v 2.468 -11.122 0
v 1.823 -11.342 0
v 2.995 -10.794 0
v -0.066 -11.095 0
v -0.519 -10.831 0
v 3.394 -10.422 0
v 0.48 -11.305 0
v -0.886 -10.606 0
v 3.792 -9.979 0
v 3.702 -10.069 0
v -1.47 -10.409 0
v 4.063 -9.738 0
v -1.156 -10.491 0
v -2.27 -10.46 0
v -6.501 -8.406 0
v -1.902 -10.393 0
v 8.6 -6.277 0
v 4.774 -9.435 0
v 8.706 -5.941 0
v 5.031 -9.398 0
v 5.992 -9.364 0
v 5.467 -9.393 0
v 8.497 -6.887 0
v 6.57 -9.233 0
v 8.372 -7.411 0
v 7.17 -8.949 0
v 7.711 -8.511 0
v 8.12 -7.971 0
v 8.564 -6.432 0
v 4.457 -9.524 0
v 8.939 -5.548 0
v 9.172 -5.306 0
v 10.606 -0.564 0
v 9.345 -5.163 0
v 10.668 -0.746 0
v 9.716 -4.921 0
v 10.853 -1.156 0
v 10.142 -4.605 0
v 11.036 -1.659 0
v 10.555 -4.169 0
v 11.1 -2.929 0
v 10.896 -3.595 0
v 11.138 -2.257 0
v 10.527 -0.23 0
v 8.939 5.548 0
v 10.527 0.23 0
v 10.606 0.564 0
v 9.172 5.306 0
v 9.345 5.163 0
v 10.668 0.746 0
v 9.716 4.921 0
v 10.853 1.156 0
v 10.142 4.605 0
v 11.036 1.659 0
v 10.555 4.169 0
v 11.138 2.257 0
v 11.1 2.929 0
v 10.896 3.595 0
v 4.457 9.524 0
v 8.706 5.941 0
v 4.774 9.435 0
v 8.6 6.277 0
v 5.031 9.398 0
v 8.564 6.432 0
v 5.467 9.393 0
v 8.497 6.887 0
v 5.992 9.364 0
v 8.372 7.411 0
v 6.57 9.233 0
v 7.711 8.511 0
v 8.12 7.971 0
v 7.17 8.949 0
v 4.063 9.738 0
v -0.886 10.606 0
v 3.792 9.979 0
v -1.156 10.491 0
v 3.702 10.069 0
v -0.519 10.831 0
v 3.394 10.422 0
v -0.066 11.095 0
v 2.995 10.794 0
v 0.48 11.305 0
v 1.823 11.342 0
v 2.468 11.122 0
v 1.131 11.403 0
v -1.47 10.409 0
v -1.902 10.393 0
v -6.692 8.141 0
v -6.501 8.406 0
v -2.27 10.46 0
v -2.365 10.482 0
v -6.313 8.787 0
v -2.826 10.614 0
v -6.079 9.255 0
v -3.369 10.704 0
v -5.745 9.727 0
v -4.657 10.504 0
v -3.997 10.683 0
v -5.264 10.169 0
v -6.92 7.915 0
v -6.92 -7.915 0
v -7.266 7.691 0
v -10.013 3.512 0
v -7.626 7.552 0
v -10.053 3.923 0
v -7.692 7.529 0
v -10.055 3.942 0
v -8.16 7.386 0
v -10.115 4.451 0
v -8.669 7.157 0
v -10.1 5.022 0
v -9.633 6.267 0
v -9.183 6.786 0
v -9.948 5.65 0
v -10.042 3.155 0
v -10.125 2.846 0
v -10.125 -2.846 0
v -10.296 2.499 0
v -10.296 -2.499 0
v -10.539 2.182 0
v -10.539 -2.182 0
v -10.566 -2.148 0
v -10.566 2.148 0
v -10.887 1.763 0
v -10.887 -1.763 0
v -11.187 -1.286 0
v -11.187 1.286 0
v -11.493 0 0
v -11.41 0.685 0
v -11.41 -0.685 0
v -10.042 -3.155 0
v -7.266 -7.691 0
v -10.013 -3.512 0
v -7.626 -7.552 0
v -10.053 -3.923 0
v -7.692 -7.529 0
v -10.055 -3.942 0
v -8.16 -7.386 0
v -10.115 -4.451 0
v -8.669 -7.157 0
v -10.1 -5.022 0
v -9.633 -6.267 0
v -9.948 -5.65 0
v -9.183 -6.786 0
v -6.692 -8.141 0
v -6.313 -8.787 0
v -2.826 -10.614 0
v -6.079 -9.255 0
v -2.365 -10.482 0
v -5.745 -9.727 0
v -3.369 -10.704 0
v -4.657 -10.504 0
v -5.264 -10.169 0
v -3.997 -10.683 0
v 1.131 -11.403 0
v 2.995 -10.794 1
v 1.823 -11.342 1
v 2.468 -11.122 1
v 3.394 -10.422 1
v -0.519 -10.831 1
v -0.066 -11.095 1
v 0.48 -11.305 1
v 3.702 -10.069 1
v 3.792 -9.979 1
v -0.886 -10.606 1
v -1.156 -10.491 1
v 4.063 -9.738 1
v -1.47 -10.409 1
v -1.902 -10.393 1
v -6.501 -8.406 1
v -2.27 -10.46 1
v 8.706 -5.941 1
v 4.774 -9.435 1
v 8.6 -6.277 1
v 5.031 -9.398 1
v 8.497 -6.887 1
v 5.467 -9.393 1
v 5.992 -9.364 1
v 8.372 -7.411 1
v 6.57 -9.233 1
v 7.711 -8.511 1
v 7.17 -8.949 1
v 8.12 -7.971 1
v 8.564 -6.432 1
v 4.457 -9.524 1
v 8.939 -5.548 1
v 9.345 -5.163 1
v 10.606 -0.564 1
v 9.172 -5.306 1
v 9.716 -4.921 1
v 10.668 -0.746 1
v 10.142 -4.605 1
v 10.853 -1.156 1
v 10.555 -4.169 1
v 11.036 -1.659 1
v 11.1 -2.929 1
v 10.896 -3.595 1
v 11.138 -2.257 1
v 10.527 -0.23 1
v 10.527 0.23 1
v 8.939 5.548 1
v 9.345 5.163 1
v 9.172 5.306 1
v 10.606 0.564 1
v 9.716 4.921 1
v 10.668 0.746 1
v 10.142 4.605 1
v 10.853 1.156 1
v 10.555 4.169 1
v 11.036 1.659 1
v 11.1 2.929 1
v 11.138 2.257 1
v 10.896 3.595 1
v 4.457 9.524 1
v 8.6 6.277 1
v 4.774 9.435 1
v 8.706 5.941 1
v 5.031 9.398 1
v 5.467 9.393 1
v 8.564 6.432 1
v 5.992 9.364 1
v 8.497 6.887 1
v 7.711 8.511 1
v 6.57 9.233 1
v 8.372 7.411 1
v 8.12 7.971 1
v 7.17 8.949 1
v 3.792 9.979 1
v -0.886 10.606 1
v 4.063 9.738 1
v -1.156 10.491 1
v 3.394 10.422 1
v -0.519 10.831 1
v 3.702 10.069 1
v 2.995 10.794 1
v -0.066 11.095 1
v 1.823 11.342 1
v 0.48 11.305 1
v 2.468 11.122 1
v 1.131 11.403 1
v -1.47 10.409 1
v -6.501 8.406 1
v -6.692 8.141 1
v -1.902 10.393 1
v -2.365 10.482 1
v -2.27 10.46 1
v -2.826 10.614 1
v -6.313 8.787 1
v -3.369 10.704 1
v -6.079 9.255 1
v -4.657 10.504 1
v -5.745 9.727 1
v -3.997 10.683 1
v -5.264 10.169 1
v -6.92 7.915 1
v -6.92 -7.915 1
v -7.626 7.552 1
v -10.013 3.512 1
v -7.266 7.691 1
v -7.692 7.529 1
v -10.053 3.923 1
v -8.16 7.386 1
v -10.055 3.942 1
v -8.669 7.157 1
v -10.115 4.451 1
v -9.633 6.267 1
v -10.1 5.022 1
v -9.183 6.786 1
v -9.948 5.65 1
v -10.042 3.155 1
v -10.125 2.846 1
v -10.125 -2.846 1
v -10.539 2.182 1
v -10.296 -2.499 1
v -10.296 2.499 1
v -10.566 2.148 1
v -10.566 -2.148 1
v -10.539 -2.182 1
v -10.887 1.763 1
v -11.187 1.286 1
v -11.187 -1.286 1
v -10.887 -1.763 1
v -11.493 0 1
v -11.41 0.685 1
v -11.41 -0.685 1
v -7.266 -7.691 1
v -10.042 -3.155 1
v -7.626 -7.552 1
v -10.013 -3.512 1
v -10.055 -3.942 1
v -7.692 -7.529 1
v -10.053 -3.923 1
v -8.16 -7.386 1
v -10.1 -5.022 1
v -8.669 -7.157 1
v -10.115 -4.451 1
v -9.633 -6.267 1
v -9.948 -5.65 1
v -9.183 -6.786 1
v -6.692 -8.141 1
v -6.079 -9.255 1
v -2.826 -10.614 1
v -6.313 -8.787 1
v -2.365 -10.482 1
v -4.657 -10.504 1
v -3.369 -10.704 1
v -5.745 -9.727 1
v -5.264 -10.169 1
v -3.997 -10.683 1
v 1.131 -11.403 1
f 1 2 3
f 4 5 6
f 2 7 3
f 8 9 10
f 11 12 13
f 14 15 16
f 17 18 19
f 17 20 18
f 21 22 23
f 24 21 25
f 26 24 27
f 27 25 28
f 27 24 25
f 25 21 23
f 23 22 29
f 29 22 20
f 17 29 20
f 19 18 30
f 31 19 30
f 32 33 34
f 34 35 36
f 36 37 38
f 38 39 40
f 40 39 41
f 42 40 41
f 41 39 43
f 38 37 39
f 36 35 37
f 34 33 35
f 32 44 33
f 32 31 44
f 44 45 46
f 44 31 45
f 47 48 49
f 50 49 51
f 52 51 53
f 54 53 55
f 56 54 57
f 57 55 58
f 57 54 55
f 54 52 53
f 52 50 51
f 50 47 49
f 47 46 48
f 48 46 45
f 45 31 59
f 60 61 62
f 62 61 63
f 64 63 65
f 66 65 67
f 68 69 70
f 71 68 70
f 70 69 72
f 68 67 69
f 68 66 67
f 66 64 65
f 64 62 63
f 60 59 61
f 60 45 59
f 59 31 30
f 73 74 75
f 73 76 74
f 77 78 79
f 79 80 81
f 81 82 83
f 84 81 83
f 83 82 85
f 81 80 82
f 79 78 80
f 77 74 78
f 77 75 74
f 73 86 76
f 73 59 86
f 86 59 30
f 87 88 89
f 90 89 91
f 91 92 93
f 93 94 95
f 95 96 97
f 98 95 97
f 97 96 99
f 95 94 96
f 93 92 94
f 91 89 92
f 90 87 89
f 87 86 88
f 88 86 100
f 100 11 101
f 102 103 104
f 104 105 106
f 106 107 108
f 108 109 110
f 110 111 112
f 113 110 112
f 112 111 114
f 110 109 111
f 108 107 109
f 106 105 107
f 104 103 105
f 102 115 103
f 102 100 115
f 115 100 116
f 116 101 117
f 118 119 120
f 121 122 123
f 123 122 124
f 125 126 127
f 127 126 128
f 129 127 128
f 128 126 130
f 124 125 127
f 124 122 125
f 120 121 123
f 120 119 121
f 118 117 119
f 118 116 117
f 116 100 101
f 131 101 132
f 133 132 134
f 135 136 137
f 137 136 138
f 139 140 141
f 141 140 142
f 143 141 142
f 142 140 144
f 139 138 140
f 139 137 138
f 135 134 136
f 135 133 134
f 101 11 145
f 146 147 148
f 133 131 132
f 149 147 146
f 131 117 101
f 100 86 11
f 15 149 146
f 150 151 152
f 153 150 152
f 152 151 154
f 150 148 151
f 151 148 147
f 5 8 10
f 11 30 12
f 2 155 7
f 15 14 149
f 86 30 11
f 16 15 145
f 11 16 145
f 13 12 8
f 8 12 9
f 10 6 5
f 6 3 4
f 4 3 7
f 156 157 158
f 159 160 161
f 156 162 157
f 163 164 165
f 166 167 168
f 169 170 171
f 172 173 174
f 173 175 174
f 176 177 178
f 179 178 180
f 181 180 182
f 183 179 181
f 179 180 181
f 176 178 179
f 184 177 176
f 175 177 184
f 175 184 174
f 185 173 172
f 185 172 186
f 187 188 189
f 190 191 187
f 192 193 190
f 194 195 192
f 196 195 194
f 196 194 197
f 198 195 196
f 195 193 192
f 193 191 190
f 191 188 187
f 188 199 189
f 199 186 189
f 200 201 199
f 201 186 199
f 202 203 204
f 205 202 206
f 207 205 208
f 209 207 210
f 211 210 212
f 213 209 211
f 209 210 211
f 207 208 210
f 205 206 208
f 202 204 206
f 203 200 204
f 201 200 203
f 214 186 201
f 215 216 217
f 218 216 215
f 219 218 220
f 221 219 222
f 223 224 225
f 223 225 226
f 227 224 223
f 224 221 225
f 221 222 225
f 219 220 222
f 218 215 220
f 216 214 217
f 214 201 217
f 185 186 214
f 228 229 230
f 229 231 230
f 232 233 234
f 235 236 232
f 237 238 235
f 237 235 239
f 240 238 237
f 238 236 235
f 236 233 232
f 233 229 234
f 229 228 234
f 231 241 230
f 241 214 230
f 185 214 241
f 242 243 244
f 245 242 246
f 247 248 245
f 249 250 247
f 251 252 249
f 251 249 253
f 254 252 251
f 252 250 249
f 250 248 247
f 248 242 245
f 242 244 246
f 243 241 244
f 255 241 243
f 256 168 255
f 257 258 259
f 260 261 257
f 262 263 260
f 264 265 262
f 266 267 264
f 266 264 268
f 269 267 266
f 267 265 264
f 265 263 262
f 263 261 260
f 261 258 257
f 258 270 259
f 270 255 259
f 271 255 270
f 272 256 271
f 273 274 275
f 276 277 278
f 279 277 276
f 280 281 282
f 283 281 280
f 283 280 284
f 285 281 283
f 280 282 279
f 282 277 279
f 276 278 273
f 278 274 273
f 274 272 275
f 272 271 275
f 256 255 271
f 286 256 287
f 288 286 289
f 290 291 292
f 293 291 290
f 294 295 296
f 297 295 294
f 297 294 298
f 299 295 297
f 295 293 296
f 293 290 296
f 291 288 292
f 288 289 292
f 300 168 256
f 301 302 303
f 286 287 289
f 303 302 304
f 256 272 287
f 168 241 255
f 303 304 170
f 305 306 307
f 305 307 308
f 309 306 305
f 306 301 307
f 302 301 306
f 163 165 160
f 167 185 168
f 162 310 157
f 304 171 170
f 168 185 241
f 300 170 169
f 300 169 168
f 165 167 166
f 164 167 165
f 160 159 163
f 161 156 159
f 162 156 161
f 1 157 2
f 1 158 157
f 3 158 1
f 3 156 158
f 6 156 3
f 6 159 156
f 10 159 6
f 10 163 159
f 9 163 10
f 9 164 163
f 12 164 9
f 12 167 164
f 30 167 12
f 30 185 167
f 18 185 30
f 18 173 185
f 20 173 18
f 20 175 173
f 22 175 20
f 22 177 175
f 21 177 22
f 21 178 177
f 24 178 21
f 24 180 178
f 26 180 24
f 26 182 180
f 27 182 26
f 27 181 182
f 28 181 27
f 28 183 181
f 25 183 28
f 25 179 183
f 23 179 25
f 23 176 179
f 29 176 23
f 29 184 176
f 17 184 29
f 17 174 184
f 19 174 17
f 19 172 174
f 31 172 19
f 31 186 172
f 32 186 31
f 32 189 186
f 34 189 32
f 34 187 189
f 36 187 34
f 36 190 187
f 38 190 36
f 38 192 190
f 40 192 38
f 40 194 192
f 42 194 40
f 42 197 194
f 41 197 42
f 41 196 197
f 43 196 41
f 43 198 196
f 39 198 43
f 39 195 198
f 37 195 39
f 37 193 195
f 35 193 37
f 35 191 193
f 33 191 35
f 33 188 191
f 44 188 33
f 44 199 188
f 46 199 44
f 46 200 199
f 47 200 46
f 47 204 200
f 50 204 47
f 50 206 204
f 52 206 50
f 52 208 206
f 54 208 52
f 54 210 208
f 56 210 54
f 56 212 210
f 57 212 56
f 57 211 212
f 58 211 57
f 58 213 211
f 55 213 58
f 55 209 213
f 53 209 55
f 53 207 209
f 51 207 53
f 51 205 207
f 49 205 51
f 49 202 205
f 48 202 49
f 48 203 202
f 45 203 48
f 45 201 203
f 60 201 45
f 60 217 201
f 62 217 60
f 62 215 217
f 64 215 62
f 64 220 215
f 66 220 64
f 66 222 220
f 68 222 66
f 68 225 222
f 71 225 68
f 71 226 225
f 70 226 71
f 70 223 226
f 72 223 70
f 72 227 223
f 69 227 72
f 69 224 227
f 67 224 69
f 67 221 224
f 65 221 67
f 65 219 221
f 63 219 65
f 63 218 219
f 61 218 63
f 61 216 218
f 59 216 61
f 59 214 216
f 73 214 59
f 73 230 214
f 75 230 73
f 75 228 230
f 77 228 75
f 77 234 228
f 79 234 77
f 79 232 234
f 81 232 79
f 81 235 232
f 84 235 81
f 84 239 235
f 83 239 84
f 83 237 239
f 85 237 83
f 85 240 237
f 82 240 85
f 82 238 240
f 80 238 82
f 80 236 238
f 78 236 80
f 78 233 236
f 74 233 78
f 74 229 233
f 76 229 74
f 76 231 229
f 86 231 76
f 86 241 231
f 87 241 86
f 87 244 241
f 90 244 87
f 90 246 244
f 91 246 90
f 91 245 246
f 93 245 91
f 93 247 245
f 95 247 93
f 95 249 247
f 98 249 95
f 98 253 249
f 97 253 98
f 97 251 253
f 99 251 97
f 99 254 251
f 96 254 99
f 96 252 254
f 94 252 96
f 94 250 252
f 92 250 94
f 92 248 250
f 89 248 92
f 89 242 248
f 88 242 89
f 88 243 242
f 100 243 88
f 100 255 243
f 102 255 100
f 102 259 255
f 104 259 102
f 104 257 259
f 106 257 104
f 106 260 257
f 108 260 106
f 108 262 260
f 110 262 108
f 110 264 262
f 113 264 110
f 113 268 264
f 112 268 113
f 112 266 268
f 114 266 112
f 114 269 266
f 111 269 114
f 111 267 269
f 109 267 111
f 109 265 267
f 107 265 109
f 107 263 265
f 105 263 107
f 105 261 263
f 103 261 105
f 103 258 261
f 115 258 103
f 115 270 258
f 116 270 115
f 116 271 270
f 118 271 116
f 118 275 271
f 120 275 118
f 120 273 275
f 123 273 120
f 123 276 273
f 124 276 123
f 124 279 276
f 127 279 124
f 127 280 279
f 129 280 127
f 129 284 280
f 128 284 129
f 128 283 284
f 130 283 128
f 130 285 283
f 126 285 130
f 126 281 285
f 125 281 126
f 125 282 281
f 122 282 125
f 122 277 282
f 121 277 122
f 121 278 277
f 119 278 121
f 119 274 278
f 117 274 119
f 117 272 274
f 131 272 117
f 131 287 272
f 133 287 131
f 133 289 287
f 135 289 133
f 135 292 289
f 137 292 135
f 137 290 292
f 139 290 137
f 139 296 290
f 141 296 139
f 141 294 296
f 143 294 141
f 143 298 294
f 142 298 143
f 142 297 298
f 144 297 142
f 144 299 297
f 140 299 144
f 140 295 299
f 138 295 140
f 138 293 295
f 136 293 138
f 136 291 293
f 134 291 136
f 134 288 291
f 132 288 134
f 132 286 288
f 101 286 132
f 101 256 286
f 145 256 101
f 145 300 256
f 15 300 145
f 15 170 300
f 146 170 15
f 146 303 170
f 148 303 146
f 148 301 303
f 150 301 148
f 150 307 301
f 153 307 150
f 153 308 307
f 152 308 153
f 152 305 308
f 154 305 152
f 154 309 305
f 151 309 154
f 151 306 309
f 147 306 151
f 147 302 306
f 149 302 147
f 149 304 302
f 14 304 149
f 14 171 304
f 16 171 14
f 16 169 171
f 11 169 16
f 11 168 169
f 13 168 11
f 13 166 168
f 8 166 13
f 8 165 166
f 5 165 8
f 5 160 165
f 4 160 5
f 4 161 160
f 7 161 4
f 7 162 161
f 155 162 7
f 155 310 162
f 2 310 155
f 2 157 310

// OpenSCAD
//N = 16;  // Number of rollers
//Rr = 6.5;  // Radius of the roller
//R = 4.5;   // Radius of the rollers PCD (Pitch Circle Diameter)
//E = 1.5;   // Eccentricity - offset from input shaft to a cycloidal disk
//function x(t) = 
//    (R*cos(t)) - 
//    (Rr*cos(t + atan(sin((1-N)*t) / ((R/(E*N)) - cos((1-N)*t))))) - 
//    (E*cos(N*t));
//
//function y(t) = 
//    (-R*sin(t)) + 
//    (Rr*sin(t + atan(sin((1-N)*t) / ((R/(E*N)) - cos((1-N)*t))))) + 
//    (E*sin(N*t));


/* [Epitrochoid (cycloid)] */
// Radius of large circle
R = 11;

// Radius of small circle
r = 1;

// Offset from small circle's center on which the cycloid is traced
d = 0.5;


function x(t) = (R + r) * cos(t) - d * cos( t * (R + r) / r );
function y(t) = (R + r) * sin(t) - d * sin( t * (R + r) / r );

points = [ for (t = [ 0 : 3 : 359 ])  [x(t), y(t)] ];

//echo(points);

linear_extrude(height=1) {
    offset(r=-1)
    polygon(points);
}
